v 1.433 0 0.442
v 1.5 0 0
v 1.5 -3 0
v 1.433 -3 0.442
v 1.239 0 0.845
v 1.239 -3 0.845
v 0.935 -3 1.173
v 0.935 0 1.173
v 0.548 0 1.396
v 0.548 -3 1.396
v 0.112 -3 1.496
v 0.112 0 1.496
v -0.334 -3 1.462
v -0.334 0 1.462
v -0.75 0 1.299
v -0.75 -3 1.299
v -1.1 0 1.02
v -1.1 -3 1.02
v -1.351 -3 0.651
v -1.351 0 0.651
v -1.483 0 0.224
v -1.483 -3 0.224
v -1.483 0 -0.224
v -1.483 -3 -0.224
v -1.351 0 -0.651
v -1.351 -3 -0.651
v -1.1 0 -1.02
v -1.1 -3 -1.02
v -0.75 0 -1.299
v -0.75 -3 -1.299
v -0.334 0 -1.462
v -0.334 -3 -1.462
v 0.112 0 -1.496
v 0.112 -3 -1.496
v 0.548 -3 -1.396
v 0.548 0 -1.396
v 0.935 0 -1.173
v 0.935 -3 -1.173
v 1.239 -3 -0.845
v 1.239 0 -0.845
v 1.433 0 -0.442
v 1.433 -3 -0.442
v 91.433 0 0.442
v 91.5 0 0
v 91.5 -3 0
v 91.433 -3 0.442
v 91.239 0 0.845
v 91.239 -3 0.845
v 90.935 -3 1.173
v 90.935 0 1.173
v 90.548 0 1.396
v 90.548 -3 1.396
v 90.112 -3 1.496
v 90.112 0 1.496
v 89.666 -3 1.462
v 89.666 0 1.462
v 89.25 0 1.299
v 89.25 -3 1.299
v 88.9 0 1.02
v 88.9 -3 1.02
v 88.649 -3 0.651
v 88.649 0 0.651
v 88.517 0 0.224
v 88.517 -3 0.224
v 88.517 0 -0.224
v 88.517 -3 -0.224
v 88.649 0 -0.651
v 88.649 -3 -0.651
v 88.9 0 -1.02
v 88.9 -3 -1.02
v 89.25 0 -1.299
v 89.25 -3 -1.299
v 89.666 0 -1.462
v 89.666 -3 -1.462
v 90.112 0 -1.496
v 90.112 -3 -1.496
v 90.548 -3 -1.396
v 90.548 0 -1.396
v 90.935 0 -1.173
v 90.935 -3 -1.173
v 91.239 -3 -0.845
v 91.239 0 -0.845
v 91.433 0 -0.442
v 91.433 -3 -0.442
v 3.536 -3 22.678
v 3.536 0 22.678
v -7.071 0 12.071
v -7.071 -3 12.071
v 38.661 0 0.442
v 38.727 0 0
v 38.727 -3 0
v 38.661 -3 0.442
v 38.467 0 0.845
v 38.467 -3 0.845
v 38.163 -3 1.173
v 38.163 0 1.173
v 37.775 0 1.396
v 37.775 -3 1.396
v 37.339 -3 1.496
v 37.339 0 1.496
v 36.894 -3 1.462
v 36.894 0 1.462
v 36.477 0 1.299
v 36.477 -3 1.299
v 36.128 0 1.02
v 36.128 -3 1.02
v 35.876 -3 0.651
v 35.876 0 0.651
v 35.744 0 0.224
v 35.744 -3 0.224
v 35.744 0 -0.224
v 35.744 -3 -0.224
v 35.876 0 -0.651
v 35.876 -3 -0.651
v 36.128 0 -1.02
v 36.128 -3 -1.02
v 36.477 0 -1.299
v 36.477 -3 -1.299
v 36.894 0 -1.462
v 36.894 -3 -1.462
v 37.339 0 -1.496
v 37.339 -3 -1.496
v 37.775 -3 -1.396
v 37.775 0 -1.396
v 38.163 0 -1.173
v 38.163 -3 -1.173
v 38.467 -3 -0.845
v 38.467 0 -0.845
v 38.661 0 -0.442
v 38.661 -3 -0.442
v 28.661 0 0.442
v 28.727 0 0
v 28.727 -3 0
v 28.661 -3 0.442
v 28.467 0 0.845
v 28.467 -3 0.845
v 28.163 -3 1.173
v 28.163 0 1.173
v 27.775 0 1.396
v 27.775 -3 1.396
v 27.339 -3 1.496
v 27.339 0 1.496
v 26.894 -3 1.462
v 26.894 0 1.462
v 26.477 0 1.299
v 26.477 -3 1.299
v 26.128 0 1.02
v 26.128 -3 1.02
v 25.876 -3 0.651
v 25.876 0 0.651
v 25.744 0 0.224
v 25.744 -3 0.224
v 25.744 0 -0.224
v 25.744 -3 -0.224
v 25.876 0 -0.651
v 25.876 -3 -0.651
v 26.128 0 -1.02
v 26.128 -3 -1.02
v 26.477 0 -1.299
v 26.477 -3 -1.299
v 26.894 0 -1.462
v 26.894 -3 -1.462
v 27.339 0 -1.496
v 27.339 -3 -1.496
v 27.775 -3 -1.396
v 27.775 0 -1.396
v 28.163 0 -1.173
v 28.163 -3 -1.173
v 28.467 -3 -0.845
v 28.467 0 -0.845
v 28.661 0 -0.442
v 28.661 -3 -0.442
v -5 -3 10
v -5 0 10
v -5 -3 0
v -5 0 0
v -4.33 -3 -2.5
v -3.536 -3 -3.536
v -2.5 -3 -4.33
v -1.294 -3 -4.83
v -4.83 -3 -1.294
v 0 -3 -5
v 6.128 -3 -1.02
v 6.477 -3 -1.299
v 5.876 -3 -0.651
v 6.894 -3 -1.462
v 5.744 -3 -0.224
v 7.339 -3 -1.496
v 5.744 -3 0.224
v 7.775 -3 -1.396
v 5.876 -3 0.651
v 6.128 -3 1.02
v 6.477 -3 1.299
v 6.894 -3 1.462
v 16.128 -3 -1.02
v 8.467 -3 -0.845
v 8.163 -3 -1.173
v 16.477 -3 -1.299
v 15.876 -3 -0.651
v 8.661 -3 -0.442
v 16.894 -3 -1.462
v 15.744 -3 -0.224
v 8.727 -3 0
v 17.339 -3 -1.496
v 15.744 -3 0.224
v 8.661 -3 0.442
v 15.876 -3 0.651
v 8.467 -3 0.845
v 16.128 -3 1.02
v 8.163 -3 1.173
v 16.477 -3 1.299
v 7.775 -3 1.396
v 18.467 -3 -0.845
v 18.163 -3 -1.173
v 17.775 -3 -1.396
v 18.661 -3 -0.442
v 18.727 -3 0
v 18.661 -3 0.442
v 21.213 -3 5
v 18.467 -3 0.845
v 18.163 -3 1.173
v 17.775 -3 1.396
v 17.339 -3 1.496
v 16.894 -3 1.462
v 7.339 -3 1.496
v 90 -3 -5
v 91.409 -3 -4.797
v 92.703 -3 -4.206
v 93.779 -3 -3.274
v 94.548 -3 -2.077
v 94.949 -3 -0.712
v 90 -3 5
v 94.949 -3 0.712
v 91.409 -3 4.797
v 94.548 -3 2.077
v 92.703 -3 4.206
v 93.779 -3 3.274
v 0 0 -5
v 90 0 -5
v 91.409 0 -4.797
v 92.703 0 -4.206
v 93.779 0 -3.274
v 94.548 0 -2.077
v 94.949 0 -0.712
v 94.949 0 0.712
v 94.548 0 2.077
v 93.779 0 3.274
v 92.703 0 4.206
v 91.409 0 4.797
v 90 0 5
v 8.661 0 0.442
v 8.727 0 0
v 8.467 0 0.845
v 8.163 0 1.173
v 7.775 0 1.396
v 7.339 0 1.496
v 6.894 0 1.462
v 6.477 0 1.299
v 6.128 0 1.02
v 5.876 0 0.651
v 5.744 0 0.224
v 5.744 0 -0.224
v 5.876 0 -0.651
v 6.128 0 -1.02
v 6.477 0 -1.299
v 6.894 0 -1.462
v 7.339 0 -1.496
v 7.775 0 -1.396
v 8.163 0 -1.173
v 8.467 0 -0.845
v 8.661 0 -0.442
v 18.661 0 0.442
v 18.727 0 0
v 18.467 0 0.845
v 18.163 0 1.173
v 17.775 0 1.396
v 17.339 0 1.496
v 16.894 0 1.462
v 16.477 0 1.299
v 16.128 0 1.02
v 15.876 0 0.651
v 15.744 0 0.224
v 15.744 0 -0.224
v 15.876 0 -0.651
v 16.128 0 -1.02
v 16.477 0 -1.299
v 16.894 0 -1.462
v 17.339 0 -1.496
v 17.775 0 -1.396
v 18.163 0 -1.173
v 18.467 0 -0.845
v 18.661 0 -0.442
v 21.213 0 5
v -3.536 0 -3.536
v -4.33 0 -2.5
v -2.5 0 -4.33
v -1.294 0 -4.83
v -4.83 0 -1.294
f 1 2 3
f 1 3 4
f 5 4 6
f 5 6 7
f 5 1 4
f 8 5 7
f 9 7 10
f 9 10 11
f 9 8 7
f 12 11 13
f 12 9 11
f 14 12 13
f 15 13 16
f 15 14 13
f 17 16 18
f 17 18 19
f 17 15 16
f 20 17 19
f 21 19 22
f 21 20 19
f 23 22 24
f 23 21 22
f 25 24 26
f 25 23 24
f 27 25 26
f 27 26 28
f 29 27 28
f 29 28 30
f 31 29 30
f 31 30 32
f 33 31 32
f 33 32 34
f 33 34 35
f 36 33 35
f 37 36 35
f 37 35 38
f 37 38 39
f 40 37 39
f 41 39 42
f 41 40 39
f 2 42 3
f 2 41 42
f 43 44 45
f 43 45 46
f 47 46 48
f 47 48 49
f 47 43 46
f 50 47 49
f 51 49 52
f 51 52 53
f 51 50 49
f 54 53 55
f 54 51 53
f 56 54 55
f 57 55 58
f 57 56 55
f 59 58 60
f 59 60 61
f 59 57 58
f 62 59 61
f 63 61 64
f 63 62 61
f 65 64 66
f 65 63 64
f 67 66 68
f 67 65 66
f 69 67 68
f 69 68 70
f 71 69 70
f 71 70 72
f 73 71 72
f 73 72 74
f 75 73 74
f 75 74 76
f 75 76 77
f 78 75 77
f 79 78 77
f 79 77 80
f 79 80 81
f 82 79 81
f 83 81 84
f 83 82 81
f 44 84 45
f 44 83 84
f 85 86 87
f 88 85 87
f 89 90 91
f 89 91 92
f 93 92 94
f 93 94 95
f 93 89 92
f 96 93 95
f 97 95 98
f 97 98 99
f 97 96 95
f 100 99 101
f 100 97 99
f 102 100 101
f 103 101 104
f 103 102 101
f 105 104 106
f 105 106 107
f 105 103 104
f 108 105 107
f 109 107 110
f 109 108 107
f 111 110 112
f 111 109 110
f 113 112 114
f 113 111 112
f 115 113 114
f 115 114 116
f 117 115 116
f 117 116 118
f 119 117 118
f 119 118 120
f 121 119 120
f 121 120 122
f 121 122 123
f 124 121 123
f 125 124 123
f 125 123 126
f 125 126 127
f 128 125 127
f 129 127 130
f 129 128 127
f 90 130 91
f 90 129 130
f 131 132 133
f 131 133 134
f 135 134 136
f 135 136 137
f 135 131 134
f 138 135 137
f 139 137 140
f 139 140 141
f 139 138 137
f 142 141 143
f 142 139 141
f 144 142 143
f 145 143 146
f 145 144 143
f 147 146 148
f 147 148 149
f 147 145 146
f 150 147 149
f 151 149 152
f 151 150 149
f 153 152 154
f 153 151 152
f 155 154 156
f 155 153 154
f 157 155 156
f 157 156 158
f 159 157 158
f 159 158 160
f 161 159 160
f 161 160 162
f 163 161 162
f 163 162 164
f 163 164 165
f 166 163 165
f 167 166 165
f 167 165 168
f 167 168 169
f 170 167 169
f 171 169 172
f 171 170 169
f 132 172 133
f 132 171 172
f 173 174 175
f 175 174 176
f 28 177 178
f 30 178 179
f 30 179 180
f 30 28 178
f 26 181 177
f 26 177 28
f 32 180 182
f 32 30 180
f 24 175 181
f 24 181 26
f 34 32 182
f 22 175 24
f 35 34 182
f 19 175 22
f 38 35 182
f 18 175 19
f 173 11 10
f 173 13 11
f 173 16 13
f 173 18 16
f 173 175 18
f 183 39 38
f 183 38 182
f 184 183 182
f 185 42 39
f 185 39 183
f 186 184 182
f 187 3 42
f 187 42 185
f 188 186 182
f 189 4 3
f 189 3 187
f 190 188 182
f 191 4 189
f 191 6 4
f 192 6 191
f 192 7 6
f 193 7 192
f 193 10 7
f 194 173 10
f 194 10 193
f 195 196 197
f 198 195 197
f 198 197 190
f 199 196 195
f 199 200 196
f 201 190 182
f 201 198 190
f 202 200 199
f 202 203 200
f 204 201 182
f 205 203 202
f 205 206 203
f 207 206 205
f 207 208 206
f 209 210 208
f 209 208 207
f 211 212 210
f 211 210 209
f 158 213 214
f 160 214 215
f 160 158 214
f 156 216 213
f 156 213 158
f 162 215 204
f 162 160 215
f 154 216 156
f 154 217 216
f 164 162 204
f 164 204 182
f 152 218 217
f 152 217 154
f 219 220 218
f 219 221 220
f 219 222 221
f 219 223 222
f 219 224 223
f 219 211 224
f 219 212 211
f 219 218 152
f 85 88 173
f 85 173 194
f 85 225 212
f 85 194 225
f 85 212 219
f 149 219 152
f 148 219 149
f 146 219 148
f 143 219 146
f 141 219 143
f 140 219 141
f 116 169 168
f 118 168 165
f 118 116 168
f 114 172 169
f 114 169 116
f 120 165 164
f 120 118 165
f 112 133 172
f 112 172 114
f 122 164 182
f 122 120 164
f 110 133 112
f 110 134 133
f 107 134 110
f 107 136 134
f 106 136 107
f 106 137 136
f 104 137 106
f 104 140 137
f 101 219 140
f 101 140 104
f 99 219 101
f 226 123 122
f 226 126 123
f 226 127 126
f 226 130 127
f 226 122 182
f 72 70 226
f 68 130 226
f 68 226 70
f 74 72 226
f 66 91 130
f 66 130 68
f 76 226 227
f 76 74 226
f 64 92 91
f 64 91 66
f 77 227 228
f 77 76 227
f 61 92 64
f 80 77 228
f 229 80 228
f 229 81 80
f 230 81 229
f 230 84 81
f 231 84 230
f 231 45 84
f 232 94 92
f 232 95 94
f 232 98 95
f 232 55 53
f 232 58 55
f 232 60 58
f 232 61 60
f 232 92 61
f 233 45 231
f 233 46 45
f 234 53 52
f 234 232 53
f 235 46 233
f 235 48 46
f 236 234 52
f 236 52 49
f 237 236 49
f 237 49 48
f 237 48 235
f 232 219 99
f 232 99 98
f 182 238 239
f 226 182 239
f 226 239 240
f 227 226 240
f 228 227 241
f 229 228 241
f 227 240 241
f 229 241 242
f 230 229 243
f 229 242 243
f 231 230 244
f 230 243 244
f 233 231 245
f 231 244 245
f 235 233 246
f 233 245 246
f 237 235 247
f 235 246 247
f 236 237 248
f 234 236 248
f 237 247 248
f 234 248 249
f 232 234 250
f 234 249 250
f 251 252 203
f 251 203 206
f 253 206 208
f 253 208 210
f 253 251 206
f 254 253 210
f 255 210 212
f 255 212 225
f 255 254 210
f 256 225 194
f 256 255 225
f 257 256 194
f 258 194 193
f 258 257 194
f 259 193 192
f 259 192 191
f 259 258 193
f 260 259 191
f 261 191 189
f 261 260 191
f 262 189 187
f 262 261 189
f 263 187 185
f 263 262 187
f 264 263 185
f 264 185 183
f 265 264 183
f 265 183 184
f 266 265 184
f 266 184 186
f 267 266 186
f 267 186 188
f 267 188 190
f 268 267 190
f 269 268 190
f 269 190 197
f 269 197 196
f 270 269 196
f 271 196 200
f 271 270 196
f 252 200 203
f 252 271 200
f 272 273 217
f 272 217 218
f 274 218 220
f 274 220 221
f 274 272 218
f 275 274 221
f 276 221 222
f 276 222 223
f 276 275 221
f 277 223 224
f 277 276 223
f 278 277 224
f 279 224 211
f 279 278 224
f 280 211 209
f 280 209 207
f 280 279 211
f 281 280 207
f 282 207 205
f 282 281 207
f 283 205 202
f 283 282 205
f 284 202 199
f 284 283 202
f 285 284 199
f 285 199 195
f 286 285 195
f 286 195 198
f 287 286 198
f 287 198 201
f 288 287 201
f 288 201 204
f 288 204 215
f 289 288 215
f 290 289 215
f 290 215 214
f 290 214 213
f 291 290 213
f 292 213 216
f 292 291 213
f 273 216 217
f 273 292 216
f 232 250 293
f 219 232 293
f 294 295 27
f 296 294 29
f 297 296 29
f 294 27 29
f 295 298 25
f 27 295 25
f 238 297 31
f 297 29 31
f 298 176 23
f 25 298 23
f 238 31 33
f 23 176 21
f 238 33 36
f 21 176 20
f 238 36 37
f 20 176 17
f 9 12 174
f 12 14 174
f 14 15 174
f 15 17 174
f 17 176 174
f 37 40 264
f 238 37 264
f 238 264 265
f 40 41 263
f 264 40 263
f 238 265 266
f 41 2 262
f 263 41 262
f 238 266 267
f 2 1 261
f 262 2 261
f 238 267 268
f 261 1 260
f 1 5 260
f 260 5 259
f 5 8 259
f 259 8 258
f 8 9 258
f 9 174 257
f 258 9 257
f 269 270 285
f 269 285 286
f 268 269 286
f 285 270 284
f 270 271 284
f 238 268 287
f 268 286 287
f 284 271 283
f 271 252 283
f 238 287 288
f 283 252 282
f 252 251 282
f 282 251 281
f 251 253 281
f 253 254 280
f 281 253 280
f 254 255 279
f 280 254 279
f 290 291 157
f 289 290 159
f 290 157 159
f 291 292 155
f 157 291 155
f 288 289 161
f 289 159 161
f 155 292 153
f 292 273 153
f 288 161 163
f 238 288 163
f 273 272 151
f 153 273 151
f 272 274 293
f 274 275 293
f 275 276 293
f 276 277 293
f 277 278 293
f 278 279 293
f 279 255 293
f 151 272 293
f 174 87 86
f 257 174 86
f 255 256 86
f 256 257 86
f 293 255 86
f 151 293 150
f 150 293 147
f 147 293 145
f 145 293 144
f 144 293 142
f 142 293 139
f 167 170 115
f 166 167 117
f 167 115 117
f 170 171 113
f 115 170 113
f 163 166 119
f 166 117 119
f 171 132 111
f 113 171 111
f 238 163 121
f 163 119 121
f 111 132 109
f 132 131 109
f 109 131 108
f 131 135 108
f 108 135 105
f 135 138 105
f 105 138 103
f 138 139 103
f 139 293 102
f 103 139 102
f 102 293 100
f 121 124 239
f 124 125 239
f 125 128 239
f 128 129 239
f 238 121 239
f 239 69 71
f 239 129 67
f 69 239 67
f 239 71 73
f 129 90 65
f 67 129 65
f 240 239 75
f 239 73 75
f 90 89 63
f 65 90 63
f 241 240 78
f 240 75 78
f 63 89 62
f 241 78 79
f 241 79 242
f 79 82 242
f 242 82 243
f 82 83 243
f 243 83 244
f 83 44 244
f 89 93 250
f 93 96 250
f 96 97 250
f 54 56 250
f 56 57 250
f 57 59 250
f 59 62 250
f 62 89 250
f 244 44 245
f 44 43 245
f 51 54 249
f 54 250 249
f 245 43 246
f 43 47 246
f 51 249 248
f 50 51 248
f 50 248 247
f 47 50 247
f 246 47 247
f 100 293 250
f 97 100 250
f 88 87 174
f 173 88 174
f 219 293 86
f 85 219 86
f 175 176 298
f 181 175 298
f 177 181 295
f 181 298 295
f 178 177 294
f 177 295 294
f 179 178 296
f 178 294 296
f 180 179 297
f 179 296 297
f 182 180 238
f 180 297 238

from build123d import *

# Parameters (mm, degrees)
F0_R     = 1.5
F1_DEPTH = 3


with BuildPart() as f1:
    # F0 (on Front) → F1 (new body)
    with BuildSketch(Plane.XZ):
        with BuildLine():
            Line((0, -5), (42.227316, -5))
            Line((42.227316, -5), (90, -5))
            ThreePointArc((90, -5), (95, 0), (90, 5))
            Line((90, 5), (45, 5))
            Line((45, 5), (21.213203, 5))
            Line((21.213203, 5), (3.535534, 22.67767))
            Line((3.535534, 22.67767), (-7.071068, 12.071068))
            Line((-7.071068, 12.071068), (-5, 10))
            Line((-5, 10), (-5, 0))
            ThreePointArc((-5, 0), (-3.535534, -3.535534), (0, -5))
        make_face()
        Circle(F0_R, mode=Mode.SUBTRACT)
        with Locations((7.227316, 0)):
            Circle(F0_R, mode=Mode.SUBTRACT)
        with Locations((17.227316, 0)):
            Circle(F0_R, mode=Mode.SUBTRACT)
        with Locations((27.227316, 0)):
            Circle(F0_R, mode=Mode.SUBTRACT)
        with Locations((37.227316, 0)):
            Circle(F0_R, mode=Mode.SUBTRACT)
        with Locations((90, 0)):
            Circle(F0_R, mode=Mode.SUBTRACT)
    extrude(amount=F1_DEPTH)


solid = f1.part
